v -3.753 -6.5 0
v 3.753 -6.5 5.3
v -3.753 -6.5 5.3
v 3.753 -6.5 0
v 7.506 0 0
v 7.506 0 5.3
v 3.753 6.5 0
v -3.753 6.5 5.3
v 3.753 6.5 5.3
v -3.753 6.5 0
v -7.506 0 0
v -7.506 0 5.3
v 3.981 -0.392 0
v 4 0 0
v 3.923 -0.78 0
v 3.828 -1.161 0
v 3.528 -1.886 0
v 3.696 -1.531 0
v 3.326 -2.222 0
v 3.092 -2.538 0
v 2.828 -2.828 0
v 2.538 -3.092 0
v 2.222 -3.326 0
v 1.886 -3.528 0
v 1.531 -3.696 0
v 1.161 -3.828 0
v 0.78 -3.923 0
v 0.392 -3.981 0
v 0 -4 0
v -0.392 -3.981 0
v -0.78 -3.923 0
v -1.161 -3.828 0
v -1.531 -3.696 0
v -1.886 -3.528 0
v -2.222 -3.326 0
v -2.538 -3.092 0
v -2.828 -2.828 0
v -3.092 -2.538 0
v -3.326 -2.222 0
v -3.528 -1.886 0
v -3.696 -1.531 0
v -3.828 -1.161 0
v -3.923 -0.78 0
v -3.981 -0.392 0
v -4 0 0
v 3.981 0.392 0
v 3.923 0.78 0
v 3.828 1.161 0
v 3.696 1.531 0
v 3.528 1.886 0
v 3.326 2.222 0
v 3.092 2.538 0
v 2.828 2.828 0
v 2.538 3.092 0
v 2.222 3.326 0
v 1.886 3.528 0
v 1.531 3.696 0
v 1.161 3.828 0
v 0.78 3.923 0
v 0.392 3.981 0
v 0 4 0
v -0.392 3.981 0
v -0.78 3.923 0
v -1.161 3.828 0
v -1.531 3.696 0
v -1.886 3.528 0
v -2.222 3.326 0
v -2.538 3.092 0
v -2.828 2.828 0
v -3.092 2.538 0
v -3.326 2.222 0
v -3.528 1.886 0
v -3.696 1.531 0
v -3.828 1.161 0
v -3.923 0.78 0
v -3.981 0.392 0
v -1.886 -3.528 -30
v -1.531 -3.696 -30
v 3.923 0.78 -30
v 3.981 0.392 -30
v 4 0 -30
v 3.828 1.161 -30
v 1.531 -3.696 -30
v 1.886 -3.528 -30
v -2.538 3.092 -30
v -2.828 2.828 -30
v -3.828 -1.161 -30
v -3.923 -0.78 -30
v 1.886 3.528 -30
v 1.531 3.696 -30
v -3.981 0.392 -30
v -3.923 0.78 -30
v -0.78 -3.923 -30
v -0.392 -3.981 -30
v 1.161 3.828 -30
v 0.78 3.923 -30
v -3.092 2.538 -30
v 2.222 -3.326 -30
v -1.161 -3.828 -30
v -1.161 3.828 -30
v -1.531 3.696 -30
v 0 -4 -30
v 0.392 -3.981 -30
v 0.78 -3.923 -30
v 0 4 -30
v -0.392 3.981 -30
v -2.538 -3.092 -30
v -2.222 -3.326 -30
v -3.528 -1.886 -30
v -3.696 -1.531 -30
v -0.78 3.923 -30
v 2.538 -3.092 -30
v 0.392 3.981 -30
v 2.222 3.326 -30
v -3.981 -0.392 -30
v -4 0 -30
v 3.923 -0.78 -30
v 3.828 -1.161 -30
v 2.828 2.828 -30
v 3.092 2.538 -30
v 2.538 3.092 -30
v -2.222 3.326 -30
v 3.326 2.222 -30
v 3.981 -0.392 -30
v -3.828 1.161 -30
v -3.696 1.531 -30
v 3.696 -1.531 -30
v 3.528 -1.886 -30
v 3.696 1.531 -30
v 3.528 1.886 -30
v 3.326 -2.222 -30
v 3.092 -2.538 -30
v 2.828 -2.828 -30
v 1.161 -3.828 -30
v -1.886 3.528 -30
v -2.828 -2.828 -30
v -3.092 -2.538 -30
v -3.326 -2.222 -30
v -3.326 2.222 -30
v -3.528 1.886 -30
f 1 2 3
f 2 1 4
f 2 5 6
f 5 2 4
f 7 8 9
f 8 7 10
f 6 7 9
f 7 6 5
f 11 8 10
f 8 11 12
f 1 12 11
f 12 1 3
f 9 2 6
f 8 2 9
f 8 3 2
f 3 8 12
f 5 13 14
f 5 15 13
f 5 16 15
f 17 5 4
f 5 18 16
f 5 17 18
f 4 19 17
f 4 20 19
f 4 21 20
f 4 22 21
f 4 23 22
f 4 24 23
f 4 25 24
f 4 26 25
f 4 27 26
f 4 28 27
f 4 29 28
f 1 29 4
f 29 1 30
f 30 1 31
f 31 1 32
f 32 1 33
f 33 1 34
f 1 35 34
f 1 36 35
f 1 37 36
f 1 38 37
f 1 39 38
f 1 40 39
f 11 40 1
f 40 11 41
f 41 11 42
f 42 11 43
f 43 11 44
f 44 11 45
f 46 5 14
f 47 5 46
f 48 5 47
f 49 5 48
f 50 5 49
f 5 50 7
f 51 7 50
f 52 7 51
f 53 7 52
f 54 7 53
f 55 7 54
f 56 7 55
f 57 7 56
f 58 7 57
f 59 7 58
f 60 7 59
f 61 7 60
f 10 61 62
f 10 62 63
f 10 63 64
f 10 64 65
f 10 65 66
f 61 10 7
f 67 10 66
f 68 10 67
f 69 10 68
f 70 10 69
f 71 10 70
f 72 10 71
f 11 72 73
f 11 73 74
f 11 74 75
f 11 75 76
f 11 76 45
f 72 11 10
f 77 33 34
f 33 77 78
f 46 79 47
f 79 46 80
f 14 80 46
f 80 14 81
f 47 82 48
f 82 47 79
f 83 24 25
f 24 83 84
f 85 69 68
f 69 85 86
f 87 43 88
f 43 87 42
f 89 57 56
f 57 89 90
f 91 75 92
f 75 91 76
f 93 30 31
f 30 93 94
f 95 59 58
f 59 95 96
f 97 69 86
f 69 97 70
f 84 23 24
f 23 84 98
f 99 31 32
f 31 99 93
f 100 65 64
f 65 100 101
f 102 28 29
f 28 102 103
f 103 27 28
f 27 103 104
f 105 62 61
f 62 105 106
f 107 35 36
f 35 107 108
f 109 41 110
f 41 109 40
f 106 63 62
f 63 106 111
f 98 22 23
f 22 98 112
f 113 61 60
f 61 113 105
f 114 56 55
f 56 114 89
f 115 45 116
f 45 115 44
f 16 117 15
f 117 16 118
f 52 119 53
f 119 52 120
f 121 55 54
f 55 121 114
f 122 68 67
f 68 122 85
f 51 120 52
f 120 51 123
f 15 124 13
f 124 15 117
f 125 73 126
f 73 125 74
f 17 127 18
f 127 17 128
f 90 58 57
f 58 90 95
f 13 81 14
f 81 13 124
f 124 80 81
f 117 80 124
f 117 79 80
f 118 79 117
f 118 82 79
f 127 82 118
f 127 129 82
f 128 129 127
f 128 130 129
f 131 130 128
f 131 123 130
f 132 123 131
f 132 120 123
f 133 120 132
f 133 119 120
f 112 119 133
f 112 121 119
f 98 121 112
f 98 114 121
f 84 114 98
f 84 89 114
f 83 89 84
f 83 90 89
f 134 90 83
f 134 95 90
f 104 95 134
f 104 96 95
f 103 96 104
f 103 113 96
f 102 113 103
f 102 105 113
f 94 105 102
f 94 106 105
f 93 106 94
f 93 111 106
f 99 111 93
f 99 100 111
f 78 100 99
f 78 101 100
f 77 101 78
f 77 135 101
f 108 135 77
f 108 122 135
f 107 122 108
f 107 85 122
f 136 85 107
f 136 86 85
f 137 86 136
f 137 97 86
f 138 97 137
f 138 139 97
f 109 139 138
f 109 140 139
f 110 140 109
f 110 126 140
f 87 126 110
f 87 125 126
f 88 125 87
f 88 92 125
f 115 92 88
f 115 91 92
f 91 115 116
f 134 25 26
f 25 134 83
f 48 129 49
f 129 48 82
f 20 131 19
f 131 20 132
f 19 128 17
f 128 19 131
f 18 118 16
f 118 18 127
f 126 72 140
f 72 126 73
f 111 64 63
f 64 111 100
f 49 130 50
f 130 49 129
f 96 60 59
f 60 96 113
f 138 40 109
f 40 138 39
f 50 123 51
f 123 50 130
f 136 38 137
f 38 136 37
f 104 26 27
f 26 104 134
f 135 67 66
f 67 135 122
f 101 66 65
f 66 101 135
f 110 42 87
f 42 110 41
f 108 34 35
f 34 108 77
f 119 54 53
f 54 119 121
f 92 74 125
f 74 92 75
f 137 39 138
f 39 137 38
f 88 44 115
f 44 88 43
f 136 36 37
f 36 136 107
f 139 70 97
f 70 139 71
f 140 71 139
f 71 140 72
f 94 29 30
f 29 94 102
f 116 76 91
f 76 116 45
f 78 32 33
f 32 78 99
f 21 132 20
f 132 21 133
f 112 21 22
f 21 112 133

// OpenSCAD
// M8 Hex Bolt (Simplified)

// Parameters
s = 13;      // Across-flats (二面幅)
k = 5.3;     // Head height (頭部高さ)
d = 8;       // Shank diameter (軸径)
l = 30;      // Shank length (軸長さ)
$fn = 64;    // Resolution

union() {
    // Head: Hexagonal prism
    // In OpenSCAD, cylinder with $fn=6 creates a polygon where 'r' is the circumradius.
    // Circumradius = (Across-flats / 2) / cos(30)
    translate([0, 0, 0])
        rotate([0, 0, 0])
        cylinder(h = k, r = (s / 2) / cos(30), $fn = 6);

    // Shank: Cylinder
    // Extending towards z < 0
    translate([0, 0, -l])
        cylinder(h = l, d = d);
}
